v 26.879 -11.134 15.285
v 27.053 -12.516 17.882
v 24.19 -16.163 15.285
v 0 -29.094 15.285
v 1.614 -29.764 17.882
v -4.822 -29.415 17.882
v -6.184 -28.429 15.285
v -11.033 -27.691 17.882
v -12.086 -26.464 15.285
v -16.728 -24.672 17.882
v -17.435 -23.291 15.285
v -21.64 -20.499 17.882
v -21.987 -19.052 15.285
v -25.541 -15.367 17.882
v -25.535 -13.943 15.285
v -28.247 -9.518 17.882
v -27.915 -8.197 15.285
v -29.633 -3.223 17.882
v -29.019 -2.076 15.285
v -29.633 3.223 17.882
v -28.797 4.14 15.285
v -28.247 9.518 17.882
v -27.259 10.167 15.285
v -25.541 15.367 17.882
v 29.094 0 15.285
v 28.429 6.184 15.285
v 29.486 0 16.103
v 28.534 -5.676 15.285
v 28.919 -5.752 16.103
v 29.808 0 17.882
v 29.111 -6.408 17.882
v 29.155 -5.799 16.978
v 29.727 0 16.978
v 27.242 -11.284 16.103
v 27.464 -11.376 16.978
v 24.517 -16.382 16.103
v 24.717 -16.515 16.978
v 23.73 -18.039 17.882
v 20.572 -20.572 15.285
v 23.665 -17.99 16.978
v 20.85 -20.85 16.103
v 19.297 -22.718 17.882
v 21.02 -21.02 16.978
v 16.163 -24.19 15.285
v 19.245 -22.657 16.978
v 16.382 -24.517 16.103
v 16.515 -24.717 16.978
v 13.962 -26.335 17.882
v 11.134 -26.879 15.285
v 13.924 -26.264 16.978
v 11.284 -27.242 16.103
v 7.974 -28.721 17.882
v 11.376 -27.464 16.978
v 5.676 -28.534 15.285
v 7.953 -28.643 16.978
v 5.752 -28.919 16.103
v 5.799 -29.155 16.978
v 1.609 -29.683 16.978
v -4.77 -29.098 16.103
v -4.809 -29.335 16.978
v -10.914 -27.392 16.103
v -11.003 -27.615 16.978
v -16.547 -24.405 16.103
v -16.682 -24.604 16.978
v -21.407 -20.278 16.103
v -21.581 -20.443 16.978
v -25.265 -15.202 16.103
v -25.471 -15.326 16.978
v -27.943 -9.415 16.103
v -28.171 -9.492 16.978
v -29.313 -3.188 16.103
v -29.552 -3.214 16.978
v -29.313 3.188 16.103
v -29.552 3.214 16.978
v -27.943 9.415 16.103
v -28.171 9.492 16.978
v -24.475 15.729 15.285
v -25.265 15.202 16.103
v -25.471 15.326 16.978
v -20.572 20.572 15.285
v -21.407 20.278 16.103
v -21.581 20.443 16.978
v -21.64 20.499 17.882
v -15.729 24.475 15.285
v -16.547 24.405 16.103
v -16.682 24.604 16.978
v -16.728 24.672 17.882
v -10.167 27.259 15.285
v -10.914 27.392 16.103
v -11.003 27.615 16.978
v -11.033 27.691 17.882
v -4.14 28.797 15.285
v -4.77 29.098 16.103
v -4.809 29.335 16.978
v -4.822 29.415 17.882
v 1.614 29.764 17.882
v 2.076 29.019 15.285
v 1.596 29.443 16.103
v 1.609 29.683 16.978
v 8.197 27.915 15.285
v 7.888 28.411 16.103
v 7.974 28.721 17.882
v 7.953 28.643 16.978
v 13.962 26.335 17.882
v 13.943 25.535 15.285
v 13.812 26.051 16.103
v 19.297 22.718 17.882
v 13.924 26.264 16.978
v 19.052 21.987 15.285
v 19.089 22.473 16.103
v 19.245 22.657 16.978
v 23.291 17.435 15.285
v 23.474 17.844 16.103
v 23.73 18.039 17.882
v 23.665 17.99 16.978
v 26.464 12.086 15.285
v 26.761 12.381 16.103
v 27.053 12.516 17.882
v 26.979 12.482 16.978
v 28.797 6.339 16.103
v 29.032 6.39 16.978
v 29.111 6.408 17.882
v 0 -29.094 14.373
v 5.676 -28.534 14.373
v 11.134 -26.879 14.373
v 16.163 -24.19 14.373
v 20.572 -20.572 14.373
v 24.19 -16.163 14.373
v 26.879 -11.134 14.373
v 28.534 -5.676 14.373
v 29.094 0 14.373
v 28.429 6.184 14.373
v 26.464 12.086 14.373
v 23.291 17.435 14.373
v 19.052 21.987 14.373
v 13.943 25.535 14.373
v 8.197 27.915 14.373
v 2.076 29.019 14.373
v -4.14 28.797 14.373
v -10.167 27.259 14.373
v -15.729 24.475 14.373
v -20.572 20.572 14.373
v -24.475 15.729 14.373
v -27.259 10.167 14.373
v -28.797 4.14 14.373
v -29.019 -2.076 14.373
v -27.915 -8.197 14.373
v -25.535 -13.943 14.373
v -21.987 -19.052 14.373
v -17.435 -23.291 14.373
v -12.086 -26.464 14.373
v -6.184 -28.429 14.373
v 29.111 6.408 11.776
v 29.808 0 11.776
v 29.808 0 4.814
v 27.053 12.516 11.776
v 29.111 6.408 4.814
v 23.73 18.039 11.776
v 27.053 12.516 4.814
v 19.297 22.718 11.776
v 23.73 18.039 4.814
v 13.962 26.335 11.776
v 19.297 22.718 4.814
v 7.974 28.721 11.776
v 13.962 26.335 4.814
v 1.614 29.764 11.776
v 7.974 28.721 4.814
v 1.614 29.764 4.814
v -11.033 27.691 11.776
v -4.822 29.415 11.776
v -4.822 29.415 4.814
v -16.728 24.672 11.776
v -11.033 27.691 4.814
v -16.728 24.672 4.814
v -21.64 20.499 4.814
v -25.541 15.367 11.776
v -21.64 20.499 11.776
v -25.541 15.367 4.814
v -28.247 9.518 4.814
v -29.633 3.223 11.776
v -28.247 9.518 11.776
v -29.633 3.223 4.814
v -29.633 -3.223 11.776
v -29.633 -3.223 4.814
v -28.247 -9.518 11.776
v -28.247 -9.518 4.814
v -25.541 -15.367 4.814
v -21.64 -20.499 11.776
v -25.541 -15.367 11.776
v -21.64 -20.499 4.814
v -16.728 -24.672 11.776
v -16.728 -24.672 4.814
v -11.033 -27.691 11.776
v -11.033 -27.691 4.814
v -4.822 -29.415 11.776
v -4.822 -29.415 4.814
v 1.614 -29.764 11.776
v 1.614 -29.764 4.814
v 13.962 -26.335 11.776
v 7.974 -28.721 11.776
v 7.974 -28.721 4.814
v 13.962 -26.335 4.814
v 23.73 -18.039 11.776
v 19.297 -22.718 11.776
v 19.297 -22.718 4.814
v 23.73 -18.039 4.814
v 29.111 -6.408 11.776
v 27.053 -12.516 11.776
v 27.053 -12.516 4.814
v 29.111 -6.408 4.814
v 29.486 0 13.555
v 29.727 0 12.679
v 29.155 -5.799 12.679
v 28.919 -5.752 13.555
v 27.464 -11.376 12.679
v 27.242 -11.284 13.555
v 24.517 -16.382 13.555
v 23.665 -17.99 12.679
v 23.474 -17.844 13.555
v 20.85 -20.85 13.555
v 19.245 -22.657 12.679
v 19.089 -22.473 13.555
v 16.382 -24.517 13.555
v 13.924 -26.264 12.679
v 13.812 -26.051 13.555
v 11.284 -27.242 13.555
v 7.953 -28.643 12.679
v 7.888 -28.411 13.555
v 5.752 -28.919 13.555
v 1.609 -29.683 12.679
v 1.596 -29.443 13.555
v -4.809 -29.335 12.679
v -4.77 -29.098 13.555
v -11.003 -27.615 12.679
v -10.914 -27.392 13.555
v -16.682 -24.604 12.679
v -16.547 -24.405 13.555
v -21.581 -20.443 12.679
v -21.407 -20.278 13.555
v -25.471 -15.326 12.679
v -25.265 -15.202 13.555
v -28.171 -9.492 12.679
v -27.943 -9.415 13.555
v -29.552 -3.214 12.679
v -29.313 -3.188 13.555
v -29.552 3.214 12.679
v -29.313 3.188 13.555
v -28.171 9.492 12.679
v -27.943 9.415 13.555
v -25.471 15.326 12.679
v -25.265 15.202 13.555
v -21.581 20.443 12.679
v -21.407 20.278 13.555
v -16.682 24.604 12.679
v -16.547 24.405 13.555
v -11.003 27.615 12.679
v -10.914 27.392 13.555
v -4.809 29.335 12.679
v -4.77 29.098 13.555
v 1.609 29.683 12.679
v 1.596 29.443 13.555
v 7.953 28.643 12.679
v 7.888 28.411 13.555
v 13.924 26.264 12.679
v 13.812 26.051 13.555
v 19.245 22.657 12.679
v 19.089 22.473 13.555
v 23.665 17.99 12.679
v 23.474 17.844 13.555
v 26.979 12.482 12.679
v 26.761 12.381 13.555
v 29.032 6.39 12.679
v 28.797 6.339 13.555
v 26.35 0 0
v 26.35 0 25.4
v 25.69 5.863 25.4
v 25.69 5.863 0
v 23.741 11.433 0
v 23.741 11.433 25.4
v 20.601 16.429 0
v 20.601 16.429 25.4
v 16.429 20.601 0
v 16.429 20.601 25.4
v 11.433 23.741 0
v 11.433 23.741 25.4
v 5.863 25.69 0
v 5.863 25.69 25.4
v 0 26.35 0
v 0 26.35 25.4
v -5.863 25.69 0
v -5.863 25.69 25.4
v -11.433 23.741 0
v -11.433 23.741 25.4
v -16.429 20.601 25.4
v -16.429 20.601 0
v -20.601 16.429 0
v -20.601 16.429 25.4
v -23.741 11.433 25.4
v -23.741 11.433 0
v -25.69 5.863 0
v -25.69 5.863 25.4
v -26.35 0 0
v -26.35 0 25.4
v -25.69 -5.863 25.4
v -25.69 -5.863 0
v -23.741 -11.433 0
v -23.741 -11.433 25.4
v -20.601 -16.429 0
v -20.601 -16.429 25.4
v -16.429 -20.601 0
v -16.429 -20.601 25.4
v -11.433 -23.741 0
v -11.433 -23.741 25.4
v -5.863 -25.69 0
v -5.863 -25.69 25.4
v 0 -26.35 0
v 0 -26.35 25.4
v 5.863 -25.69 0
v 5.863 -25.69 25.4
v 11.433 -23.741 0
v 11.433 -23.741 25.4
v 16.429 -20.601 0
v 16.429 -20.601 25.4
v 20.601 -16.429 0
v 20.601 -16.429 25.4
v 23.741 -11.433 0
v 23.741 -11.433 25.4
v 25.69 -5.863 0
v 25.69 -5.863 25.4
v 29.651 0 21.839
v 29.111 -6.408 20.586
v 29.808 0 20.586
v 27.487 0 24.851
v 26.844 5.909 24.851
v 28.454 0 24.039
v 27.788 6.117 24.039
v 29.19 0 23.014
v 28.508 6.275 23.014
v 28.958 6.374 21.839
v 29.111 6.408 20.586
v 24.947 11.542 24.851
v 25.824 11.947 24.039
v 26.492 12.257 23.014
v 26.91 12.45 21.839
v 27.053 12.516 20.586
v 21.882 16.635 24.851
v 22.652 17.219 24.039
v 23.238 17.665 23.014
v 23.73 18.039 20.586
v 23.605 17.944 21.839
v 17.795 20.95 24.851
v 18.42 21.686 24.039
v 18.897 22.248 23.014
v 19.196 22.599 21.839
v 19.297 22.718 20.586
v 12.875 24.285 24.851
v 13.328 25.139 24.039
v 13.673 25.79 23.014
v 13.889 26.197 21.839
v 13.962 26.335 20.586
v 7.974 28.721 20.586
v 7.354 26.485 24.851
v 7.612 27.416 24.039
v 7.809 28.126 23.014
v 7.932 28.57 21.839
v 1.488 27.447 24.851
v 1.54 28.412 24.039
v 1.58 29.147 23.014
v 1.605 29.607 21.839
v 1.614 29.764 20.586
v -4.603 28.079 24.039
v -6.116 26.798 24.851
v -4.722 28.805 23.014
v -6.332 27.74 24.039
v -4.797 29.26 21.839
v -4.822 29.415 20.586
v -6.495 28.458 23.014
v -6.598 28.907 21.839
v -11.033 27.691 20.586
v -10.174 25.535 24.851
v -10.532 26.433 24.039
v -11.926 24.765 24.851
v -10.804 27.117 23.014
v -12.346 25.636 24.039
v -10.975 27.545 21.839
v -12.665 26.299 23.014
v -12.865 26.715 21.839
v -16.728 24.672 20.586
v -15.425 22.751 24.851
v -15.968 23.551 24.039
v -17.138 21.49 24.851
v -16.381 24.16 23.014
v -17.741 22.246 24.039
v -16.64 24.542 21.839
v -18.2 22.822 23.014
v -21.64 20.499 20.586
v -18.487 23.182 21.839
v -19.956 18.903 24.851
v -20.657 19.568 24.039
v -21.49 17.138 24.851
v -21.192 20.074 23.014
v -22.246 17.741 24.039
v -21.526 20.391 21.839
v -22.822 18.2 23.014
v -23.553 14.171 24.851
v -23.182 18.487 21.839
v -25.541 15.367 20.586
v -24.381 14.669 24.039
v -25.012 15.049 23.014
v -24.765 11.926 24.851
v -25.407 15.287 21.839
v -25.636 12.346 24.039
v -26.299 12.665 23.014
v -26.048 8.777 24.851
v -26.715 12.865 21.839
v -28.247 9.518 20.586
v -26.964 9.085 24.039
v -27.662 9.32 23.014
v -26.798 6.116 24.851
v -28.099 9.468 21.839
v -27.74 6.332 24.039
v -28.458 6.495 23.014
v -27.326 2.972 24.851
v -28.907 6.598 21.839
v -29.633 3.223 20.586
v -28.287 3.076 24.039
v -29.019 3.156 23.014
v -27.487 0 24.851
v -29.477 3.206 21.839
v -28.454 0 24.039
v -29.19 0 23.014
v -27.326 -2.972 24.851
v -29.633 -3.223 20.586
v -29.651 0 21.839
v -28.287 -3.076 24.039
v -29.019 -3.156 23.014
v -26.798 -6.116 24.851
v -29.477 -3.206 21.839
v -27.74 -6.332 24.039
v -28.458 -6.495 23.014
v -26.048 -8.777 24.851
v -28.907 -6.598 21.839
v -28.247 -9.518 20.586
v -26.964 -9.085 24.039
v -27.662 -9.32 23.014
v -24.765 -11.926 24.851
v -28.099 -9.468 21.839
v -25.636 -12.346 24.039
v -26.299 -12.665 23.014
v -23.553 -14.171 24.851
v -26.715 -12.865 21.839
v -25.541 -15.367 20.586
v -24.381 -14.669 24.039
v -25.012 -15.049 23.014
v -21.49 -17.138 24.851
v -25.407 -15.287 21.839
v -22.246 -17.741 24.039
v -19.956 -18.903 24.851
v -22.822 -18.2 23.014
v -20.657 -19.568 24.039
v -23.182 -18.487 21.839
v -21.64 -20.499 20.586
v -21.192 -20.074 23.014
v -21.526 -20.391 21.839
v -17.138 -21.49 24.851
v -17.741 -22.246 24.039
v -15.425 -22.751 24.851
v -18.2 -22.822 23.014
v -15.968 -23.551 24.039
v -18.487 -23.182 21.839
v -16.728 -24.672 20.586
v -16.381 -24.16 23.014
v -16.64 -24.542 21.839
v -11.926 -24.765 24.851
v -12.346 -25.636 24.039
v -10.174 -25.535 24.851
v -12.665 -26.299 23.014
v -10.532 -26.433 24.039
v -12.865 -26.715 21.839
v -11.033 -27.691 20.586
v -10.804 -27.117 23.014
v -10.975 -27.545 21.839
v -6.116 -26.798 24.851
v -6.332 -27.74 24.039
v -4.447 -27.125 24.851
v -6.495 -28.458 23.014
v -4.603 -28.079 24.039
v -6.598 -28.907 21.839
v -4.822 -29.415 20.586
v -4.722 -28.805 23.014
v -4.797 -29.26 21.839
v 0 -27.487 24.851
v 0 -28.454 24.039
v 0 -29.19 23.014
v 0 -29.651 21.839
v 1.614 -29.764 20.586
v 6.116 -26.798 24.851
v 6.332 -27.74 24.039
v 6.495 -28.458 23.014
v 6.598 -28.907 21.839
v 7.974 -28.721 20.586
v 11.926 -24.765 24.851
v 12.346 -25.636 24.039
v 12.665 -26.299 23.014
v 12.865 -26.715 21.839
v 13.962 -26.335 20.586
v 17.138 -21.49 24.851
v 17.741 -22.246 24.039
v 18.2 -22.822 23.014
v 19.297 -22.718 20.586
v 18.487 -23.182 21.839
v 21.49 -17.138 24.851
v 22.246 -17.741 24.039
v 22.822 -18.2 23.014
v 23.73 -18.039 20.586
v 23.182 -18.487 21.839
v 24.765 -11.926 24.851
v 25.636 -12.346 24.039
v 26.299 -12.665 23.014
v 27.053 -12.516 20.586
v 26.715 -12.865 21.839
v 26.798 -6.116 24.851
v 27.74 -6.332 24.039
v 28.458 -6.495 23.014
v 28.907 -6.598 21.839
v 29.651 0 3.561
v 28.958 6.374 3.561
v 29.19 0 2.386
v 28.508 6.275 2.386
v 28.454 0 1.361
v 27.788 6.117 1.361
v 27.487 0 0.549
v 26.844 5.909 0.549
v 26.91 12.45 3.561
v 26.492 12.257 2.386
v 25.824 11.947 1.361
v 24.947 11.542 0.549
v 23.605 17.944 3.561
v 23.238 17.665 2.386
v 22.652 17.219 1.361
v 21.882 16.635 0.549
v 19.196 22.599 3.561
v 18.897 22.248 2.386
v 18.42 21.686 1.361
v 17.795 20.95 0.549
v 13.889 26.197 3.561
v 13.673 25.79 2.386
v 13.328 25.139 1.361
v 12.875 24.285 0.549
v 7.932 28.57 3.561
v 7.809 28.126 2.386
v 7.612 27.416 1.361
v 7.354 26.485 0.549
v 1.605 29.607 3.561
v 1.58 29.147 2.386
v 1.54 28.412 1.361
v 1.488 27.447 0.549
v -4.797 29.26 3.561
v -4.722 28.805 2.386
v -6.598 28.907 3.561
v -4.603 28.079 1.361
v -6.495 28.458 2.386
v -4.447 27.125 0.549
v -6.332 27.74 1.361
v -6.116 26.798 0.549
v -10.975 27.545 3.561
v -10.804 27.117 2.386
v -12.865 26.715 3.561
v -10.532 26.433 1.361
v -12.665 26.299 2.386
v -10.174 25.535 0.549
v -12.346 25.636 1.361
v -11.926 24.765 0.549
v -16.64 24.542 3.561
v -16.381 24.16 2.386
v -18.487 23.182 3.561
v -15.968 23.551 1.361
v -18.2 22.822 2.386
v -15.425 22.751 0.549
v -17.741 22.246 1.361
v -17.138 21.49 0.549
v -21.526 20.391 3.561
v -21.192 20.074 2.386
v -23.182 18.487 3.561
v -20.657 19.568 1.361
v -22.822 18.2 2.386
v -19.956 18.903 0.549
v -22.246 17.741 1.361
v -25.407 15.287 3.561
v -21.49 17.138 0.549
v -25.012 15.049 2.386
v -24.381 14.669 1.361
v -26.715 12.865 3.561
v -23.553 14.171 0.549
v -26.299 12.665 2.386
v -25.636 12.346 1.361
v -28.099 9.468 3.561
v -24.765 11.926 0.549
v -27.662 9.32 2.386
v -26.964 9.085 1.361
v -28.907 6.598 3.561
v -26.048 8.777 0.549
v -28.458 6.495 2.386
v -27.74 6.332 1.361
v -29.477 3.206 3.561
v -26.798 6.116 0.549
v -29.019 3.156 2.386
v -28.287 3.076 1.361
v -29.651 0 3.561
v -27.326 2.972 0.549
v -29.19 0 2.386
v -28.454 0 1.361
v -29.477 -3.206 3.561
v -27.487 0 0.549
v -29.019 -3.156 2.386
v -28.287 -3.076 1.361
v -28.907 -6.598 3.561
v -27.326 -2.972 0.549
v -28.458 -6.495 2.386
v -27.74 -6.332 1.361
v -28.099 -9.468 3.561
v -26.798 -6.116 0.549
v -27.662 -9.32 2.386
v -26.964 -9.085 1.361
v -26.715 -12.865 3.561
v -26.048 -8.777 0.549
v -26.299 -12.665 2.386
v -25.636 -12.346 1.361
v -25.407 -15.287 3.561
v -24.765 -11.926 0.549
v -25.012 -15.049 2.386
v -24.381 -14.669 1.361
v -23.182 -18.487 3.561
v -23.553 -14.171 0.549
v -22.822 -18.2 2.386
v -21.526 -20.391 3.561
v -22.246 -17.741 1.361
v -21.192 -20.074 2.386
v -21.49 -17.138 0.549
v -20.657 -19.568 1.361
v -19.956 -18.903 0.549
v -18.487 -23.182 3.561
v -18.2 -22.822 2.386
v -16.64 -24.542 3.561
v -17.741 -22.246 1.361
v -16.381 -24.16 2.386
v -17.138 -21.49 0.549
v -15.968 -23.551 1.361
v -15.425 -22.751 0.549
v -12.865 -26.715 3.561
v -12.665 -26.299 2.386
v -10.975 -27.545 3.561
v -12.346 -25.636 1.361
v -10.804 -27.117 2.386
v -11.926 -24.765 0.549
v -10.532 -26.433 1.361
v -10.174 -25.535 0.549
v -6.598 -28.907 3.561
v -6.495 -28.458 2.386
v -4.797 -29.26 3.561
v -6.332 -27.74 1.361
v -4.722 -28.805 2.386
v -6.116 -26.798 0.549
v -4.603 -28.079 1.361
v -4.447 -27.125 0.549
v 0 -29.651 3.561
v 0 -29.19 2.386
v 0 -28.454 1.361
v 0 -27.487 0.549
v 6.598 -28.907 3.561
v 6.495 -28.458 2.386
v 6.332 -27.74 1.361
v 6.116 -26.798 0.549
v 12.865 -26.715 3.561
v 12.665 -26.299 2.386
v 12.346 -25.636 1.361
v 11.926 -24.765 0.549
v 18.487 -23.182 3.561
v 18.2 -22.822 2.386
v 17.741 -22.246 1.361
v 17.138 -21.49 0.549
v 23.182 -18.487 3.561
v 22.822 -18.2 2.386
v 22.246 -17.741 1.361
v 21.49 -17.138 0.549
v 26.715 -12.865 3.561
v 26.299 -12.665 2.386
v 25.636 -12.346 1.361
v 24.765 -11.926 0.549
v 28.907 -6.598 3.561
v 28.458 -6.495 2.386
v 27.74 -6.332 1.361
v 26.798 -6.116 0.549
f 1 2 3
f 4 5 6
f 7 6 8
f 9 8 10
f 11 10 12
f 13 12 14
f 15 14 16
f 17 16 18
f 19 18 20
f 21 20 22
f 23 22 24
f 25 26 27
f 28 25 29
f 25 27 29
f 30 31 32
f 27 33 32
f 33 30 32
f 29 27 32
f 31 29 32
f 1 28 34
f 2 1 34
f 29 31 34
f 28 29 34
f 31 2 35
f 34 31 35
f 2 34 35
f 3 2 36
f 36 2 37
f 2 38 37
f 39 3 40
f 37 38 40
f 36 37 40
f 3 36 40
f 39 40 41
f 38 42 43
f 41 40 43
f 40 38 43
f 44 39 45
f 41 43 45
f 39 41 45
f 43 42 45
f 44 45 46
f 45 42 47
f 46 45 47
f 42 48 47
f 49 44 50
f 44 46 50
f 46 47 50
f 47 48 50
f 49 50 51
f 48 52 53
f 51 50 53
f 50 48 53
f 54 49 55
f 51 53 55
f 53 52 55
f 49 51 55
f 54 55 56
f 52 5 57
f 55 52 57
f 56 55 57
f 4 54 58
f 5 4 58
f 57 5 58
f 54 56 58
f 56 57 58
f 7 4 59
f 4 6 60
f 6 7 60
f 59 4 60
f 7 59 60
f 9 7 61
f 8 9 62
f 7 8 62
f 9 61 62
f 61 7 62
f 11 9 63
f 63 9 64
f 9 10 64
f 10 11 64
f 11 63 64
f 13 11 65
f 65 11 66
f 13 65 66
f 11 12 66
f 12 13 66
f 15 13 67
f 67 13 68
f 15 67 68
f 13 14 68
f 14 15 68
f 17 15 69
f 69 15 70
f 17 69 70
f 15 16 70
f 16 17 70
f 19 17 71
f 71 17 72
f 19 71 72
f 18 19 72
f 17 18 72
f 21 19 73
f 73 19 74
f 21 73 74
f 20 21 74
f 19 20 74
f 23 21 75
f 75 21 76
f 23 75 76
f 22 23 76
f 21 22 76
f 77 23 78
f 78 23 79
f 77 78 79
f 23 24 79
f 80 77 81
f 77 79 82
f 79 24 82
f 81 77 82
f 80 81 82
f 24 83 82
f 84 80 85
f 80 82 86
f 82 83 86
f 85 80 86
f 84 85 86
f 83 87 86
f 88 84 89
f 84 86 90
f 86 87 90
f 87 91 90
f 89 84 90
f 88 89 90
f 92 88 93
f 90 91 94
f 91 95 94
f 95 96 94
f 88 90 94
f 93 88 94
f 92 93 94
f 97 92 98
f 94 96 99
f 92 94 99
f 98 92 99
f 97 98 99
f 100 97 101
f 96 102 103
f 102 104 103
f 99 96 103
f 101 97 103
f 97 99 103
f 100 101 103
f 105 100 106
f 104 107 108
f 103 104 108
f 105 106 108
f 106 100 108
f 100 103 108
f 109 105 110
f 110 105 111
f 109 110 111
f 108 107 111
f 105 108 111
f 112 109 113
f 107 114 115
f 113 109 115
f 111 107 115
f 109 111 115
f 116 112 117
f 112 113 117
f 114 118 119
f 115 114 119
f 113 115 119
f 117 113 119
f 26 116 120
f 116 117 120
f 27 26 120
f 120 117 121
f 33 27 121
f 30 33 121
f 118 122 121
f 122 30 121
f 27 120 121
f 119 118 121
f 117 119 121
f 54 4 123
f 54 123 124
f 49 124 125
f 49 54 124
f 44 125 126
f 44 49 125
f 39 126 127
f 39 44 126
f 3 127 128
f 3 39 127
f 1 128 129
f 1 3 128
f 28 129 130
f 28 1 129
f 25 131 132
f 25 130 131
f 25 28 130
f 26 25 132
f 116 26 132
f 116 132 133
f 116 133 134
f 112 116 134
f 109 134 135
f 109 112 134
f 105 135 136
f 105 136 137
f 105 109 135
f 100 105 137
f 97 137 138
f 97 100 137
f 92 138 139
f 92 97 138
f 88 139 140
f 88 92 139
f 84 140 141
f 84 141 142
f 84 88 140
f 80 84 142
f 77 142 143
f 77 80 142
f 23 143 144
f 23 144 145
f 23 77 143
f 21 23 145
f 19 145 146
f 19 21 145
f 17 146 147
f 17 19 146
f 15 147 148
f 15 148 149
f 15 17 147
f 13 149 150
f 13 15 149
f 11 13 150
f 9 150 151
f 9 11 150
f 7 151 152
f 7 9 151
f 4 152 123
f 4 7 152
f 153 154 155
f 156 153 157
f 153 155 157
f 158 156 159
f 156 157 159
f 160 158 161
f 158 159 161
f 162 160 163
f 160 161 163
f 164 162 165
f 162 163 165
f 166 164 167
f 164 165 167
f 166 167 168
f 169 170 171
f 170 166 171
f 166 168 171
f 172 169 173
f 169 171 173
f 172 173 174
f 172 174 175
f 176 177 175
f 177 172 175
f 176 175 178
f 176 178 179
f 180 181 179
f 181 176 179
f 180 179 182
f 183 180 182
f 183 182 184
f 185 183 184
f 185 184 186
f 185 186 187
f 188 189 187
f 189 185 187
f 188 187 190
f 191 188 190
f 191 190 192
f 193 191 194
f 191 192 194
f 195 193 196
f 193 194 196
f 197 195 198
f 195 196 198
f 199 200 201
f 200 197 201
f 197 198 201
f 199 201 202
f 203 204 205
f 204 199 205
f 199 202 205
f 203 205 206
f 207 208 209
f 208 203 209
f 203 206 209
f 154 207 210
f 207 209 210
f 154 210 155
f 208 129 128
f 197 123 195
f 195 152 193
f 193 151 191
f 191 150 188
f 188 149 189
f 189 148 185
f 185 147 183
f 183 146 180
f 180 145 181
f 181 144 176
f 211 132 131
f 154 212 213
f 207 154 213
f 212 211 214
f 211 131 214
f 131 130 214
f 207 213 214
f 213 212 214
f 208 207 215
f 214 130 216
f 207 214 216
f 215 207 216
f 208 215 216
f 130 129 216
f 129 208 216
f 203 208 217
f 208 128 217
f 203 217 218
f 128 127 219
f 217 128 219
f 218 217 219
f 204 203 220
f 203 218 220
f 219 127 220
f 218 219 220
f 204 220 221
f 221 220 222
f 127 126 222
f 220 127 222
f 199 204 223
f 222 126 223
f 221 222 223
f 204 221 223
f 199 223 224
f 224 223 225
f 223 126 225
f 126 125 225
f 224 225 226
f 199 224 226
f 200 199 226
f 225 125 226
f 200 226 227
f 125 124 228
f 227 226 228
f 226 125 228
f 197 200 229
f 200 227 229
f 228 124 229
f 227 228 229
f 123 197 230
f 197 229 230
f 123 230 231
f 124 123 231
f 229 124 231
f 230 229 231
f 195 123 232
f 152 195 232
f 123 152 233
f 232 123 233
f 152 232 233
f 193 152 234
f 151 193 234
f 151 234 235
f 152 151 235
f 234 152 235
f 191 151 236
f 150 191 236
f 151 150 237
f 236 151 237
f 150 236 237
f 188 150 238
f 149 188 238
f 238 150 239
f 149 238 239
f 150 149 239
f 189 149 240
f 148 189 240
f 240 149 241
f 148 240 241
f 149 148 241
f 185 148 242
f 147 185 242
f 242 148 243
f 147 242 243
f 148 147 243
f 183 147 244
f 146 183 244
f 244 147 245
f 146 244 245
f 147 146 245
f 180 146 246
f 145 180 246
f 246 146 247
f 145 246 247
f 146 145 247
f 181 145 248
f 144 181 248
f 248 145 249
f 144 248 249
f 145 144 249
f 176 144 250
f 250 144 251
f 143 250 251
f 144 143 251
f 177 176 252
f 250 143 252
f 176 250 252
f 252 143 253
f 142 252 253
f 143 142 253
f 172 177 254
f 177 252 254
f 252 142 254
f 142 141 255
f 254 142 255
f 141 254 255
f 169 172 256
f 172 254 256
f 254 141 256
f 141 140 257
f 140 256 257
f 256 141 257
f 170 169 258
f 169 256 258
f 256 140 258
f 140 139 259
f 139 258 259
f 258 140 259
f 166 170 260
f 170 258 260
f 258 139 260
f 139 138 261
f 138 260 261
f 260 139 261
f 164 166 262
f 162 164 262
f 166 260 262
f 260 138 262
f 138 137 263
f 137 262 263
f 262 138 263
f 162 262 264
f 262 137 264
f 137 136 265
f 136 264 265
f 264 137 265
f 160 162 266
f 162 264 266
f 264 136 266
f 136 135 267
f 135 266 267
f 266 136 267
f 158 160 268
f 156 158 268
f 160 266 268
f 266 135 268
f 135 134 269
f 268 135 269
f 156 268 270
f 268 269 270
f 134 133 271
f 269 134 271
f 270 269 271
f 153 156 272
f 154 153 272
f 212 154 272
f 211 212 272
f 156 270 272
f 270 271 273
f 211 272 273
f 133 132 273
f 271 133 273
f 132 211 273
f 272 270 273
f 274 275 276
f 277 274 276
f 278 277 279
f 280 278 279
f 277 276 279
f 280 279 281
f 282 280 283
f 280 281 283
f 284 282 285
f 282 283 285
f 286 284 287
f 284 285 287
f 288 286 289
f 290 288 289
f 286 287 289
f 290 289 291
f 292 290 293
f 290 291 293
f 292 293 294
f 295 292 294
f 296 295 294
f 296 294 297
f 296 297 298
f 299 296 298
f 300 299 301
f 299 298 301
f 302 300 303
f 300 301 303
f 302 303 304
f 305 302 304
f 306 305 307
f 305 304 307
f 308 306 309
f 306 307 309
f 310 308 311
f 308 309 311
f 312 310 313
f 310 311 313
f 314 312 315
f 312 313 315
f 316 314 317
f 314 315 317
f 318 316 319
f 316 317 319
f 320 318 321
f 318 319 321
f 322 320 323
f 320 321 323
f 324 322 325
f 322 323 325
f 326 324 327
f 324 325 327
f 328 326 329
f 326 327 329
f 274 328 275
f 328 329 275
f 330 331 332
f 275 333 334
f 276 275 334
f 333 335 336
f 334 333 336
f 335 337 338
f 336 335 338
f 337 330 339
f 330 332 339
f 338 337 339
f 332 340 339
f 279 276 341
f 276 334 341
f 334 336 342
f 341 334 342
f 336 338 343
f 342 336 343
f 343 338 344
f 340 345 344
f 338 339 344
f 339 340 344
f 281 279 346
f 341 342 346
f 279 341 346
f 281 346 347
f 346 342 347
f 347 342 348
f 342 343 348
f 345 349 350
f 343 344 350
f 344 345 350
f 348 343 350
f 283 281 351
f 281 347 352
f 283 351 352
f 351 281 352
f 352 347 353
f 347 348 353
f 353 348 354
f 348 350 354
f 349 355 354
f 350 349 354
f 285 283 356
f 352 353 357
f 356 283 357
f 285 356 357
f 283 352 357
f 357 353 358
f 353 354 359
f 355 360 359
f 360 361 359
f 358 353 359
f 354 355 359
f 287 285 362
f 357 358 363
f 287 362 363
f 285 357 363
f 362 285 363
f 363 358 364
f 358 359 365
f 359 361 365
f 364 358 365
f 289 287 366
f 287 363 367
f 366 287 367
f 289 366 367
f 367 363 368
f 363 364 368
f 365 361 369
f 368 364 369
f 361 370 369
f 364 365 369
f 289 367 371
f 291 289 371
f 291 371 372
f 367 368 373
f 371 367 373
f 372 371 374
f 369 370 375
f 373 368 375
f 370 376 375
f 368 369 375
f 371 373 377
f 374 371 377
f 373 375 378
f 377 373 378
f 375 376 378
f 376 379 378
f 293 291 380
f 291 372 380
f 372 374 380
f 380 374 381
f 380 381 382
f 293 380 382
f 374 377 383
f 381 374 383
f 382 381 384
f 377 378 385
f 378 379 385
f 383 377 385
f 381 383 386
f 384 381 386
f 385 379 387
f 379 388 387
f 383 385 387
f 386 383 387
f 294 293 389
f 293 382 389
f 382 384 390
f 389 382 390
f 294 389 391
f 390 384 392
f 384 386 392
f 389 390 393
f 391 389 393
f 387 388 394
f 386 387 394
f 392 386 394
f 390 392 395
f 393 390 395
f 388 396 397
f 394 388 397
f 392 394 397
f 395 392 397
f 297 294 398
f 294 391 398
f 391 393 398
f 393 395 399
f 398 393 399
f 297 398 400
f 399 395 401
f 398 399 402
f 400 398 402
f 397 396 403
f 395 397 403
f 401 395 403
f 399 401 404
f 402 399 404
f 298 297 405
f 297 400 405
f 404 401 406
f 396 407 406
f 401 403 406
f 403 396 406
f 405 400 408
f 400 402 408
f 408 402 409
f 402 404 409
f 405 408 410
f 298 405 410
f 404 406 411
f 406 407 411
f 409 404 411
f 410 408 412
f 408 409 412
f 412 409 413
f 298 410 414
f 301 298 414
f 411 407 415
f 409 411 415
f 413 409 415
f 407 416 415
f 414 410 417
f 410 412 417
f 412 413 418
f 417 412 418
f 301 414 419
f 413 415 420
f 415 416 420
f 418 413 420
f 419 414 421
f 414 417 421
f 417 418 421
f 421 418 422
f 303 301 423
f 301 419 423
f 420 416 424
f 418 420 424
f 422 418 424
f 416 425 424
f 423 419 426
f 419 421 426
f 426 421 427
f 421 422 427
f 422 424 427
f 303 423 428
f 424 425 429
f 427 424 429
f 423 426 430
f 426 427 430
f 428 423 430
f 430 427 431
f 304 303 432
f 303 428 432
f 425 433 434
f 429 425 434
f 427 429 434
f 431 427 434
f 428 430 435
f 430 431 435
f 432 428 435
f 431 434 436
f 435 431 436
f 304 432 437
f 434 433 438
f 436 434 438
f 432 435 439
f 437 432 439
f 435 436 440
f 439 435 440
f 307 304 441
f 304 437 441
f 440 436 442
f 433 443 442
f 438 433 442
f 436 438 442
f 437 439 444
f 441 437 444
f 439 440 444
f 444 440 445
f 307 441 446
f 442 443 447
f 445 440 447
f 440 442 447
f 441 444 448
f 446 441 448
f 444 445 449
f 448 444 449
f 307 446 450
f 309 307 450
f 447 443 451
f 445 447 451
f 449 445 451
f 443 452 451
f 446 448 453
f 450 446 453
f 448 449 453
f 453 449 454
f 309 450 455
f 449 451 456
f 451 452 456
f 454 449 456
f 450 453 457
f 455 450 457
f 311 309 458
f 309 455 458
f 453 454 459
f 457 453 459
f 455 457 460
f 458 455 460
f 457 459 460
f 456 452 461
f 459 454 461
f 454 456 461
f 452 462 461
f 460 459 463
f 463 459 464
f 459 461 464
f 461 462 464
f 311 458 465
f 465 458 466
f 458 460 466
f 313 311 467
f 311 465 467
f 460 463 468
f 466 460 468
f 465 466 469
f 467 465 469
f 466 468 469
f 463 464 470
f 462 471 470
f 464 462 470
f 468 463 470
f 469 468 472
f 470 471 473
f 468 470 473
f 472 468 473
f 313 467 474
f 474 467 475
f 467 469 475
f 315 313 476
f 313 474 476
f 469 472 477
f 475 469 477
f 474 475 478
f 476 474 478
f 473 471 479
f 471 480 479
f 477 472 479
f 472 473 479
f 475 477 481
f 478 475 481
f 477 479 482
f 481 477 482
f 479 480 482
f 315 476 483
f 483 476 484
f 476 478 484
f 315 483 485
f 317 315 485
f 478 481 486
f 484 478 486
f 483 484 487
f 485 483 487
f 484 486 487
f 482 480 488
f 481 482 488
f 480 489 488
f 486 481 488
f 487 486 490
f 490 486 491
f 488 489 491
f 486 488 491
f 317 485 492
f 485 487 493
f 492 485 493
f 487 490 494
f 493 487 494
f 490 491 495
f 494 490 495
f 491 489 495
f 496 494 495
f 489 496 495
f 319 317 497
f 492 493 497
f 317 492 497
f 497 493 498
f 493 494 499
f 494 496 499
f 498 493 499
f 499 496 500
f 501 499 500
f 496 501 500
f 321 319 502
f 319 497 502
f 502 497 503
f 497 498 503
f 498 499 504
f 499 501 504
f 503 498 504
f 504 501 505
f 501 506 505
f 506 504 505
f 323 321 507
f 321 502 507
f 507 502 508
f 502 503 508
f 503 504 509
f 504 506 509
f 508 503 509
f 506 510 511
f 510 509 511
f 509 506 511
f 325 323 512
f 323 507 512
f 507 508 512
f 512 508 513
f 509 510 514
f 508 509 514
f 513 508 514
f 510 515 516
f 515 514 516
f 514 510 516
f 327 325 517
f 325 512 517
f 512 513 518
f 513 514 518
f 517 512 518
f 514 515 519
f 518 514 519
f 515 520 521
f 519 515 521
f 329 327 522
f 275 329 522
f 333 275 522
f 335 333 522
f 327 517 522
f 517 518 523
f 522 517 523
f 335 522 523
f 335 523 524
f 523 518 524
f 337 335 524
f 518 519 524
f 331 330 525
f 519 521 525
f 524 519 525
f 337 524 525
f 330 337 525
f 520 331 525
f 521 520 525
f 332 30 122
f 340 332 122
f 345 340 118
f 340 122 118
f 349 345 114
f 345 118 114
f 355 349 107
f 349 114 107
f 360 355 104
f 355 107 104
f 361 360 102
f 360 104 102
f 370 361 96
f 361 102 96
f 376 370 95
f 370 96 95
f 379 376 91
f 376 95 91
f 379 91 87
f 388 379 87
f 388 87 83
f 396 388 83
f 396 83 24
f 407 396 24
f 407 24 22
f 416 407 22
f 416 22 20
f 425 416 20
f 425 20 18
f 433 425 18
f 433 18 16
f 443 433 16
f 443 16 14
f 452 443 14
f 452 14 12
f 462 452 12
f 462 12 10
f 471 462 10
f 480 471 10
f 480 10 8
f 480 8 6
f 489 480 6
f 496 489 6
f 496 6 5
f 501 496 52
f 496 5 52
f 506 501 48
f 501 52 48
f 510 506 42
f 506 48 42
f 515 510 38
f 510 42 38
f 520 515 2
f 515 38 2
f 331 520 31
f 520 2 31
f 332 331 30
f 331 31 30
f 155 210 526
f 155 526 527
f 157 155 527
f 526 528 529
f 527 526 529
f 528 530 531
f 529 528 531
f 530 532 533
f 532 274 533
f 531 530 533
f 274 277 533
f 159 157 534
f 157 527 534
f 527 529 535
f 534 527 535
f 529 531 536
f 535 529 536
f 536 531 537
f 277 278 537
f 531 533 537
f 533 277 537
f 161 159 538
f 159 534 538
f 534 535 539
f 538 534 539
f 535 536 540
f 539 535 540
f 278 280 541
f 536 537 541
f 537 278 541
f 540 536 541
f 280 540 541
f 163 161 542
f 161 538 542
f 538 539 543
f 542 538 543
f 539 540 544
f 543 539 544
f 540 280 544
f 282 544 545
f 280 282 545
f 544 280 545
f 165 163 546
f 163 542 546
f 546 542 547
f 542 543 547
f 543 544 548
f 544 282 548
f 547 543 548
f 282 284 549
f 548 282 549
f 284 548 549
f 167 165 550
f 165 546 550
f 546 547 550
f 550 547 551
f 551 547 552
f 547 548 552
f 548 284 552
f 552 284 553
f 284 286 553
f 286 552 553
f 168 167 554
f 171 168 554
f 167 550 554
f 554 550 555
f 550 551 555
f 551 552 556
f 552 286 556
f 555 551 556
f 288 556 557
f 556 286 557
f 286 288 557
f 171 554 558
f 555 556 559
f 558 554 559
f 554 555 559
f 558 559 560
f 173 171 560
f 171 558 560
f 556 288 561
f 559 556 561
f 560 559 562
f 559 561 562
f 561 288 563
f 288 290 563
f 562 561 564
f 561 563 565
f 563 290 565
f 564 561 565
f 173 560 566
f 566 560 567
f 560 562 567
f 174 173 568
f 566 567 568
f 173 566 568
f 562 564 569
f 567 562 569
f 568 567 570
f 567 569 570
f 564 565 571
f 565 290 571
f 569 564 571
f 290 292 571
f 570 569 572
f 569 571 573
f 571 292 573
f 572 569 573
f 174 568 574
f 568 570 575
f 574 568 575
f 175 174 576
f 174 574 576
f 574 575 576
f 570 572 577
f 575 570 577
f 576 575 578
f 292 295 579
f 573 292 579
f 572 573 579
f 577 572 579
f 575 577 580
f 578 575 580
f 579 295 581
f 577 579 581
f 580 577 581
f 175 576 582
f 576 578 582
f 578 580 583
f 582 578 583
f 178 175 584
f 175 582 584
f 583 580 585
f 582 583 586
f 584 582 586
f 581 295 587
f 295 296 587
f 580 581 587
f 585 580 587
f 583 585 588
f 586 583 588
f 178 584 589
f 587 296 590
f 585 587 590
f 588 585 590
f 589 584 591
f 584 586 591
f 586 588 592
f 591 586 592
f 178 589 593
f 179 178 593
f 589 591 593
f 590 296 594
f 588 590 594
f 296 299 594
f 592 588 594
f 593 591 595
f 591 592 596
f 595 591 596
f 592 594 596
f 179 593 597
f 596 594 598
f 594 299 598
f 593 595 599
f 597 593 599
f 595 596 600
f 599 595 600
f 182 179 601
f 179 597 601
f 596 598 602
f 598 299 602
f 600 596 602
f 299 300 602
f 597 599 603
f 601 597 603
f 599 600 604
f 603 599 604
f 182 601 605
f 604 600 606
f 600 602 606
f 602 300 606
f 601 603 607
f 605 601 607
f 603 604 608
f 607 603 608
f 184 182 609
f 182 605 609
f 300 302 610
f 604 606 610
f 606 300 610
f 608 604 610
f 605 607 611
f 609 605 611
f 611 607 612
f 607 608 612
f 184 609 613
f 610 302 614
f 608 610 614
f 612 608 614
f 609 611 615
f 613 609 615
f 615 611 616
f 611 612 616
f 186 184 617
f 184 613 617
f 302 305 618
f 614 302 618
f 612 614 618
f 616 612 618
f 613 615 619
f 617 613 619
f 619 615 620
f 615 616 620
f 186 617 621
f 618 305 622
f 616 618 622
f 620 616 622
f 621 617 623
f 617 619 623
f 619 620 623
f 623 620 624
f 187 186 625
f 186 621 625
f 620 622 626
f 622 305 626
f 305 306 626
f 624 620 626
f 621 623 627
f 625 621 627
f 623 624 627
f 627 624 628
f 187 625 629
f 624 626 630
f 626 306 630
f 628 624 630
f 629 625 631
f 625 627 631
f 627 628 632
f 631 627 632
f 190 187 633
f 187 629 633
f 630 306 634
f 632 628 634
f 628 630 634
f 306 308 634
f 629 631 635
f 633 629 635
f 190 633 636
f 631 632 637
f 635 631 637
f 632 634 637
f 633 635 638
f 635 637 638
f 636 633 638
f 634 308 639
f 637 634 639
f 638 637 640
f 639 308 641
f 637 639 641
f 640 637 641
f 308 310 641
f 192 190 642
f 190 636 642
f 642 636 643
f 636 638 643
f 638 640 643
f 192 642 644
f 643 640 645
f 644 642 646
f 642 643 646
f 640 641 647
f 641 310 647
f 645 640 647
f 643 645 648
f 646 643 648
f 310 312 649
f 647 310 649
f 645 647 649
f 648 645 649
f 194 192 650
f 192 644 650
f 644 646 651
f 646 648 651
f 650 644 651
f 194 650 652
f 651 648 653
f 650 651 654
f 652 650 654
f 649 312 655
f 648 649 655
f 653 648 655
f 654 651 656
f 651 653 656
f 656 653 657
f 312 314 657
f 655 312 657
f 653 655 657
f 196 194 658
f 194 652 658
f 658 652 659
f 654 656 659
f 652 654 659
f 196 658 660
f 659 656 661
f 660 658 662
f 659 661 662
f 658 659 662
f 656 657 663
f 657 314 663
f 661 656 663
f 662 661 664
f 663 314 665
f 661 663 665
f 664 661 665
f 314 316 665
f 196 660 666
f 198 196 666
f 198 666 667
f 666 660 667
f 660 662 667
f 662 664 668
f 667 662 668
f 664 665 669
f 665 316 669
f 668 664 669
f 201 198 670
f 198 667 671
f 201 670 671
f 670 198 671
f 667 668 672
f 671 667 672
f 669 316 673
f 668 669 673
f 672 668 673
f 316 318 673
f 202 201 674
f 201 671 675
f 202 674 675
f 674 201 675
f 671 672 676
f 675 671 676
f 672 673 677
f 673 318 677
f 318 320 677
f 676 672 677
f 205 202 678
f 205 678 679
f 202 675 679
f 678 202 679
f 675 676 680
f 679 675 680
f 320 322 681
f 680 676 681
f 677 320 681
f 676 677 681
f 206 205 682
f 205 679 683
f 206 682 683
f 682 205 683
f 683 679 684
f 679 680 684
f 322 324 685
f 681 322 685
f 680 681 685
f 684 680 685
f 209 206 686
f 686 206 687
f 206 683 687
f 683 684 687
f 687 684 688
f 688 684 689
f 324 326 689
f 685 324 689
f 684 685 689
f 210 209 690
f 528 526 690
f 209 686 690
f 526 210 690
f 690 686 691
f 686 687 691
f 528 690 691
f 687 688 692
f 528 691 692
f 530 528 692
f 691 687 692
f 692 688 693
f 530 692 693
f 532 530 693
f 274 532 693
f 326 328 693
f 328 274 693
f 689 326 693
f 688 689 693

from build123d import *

# Parameters (mm, degrees)
F0_R     = 29.8077198066
F1_DEPTH = 25.4
F2_R     = 26.3502536292
F3_DEPTH = 25.4
F4_W     = 2.8885006905
F4_H     = 0.9121578187


# Not quite as in the source:
# - a fillet or chamfer that OpenCascade refuses, or shapes differently, is made with other operations: its cross-section is extruded or revolved along the edge and cut away or added


with BuildPart() as f1:
    # F0 (on Top) → F1 (new body)
    with BuildSketch(Plane.XY):
        Circle(F0_R)
    extrude(amount=F1_DEPTH)

    # F2 (on face) → F3 (cut)
    with BuildSketch(Plane.XY.offset(25.4)):
        Circle(F2_R)
    extrude(amount=-F3_DEPTH, mode=Mode.SUBTRACT)

    # F4 (on Right) → F6 (revolve, cut)
    with BuildSketch(Plane.YZ):
        with Locations((-30.5377691984, 14.828927815)):
            Rectangle(F4_W, F4_H)
    revolve(axis=Axis((0, 0, 31.8907126784), (0, 0, 1)), mode=Mode.SUBTRACT)

    # F7: fillet of radius 5.08 on 6 edges, made by hand

    # F7_s1 → F7_t2 (revolve, cut)
    with BuildSketch(Plane.XZ):
        with BuildLine():
            ThreePointArc((29.0935188532, 15.2850067243), (29.6259163705, 16.5354769537), (29.8077198066, 17.8823512692))
            Line((29.8077198066, 17.8823512692), (29.9093198066, 17.8823512692))
            Line((29.9093198066, 17.8823512692), (29.9093198066, 15.2850067243))
            Line((29.9093198066, 15.2850067243), (29.8077198066, 15.1834067243))
            ThreePointArc((29.8077198066, 15.1834067243), (29.4506193299, 15.1834067243), (29.1808348341, 15.2330598334))
            Line((29.1808348341, 15.2330598334), (29.0935188532, 15.2850067243))
        make_face()
    revolve(axis=Axis((0, 0, 15.2850067243), (0, 0, -1)), mode=Mode.SUBTRACT)

    # F7_s3 → F7_t4 (revolve, cut)
    with BuildSketch(Plane.XZ):
        with BuildLine():
            ThreePointArc((26.3502536292, 25.4), (28.8537876574, 23.5495222224), (29.8077198066, 20.5860843387))
            Line((29.8077198066, 20.5860843387), (29.9093198066, 20.5860843387))
            Line((29.9093198066, 20.5860843387), (29.9093198066, 25.4))
            Line((29.9093198066, 25.4), (29.8077198066, 25.5016))
            ThreePointArc((29.8077198066, 25.5016), (28.0789867179, 25.5016), (26.3827043057, 25.4962783132))
            Line((26.3827043057, 25.4962783132), (26.3502536292, 25.4))
        make_face()
    revolve(axis=Axis((0, 0, 25.4), (0, 0, 1)), mode=Mode.SUBTRACT)

    # F7_s5 → F7_t6 (revolve, cut)
    with BuildSketch(Plane.XZ):
        with BuildLine():
            ThreePointArc((29.8077198066, 4.8139156613), (28.8537876574, 1.8504777776), (26.3502536292, 0))
            Line((26.3502536292, 0), (26.3827043057, -0.0962783132))
            ThreePointArc((26.3827043057, -0.0962783132), (28.0789867179, -0.1016), (29.8077198066, -0.1016))
            Line((29.8077198066, -0.1016), (29.9093198066, 0))
            Line((29.9093198066, 0), (29.9093198066, 4.8139156613))
            Line((29.9093198066, 4.8139156613), (29.8077198066, 4.8139156613))
        make_face()
    revolve(axis=Axis((0, 0, 0), (0, 0, 1)), mode=Mode.SUBTRACT)

    # F7_s7 → F7_t8 (revolve, cut)
    with BuildSketch(Plane.XZ):
        with BuildLine():
            ThreePointArc((29.8077198066, 11.7755043607), (29.6259163705, 13.1223786762), (29.0935188532, 14.3728489056))
            Line((29.0935188532, 14.3728489056), (29.1808348341, 14.4247957965))
            ThreePointArc((29.1808348341, 14.4247957965), (29.4506193299, 14.4744489056), (29.8077198066, 14.4744489056))
            Line((29.8077198066, 14.4744489056), (29.9093198066, 14.3728489056))
            Line((29.9093198066, 14.3728489056), (29.9093198066, 11.7755043607))
            Line((29.9093198066, 11.7755043607), (29.8077198066, 11.7755043607))
        make_face()
    revolve(axis=Axis((0, 0, 14.3728489056), (0, 0, -1)), mode=Mode.SUBTRACT)


solid = f1.part
